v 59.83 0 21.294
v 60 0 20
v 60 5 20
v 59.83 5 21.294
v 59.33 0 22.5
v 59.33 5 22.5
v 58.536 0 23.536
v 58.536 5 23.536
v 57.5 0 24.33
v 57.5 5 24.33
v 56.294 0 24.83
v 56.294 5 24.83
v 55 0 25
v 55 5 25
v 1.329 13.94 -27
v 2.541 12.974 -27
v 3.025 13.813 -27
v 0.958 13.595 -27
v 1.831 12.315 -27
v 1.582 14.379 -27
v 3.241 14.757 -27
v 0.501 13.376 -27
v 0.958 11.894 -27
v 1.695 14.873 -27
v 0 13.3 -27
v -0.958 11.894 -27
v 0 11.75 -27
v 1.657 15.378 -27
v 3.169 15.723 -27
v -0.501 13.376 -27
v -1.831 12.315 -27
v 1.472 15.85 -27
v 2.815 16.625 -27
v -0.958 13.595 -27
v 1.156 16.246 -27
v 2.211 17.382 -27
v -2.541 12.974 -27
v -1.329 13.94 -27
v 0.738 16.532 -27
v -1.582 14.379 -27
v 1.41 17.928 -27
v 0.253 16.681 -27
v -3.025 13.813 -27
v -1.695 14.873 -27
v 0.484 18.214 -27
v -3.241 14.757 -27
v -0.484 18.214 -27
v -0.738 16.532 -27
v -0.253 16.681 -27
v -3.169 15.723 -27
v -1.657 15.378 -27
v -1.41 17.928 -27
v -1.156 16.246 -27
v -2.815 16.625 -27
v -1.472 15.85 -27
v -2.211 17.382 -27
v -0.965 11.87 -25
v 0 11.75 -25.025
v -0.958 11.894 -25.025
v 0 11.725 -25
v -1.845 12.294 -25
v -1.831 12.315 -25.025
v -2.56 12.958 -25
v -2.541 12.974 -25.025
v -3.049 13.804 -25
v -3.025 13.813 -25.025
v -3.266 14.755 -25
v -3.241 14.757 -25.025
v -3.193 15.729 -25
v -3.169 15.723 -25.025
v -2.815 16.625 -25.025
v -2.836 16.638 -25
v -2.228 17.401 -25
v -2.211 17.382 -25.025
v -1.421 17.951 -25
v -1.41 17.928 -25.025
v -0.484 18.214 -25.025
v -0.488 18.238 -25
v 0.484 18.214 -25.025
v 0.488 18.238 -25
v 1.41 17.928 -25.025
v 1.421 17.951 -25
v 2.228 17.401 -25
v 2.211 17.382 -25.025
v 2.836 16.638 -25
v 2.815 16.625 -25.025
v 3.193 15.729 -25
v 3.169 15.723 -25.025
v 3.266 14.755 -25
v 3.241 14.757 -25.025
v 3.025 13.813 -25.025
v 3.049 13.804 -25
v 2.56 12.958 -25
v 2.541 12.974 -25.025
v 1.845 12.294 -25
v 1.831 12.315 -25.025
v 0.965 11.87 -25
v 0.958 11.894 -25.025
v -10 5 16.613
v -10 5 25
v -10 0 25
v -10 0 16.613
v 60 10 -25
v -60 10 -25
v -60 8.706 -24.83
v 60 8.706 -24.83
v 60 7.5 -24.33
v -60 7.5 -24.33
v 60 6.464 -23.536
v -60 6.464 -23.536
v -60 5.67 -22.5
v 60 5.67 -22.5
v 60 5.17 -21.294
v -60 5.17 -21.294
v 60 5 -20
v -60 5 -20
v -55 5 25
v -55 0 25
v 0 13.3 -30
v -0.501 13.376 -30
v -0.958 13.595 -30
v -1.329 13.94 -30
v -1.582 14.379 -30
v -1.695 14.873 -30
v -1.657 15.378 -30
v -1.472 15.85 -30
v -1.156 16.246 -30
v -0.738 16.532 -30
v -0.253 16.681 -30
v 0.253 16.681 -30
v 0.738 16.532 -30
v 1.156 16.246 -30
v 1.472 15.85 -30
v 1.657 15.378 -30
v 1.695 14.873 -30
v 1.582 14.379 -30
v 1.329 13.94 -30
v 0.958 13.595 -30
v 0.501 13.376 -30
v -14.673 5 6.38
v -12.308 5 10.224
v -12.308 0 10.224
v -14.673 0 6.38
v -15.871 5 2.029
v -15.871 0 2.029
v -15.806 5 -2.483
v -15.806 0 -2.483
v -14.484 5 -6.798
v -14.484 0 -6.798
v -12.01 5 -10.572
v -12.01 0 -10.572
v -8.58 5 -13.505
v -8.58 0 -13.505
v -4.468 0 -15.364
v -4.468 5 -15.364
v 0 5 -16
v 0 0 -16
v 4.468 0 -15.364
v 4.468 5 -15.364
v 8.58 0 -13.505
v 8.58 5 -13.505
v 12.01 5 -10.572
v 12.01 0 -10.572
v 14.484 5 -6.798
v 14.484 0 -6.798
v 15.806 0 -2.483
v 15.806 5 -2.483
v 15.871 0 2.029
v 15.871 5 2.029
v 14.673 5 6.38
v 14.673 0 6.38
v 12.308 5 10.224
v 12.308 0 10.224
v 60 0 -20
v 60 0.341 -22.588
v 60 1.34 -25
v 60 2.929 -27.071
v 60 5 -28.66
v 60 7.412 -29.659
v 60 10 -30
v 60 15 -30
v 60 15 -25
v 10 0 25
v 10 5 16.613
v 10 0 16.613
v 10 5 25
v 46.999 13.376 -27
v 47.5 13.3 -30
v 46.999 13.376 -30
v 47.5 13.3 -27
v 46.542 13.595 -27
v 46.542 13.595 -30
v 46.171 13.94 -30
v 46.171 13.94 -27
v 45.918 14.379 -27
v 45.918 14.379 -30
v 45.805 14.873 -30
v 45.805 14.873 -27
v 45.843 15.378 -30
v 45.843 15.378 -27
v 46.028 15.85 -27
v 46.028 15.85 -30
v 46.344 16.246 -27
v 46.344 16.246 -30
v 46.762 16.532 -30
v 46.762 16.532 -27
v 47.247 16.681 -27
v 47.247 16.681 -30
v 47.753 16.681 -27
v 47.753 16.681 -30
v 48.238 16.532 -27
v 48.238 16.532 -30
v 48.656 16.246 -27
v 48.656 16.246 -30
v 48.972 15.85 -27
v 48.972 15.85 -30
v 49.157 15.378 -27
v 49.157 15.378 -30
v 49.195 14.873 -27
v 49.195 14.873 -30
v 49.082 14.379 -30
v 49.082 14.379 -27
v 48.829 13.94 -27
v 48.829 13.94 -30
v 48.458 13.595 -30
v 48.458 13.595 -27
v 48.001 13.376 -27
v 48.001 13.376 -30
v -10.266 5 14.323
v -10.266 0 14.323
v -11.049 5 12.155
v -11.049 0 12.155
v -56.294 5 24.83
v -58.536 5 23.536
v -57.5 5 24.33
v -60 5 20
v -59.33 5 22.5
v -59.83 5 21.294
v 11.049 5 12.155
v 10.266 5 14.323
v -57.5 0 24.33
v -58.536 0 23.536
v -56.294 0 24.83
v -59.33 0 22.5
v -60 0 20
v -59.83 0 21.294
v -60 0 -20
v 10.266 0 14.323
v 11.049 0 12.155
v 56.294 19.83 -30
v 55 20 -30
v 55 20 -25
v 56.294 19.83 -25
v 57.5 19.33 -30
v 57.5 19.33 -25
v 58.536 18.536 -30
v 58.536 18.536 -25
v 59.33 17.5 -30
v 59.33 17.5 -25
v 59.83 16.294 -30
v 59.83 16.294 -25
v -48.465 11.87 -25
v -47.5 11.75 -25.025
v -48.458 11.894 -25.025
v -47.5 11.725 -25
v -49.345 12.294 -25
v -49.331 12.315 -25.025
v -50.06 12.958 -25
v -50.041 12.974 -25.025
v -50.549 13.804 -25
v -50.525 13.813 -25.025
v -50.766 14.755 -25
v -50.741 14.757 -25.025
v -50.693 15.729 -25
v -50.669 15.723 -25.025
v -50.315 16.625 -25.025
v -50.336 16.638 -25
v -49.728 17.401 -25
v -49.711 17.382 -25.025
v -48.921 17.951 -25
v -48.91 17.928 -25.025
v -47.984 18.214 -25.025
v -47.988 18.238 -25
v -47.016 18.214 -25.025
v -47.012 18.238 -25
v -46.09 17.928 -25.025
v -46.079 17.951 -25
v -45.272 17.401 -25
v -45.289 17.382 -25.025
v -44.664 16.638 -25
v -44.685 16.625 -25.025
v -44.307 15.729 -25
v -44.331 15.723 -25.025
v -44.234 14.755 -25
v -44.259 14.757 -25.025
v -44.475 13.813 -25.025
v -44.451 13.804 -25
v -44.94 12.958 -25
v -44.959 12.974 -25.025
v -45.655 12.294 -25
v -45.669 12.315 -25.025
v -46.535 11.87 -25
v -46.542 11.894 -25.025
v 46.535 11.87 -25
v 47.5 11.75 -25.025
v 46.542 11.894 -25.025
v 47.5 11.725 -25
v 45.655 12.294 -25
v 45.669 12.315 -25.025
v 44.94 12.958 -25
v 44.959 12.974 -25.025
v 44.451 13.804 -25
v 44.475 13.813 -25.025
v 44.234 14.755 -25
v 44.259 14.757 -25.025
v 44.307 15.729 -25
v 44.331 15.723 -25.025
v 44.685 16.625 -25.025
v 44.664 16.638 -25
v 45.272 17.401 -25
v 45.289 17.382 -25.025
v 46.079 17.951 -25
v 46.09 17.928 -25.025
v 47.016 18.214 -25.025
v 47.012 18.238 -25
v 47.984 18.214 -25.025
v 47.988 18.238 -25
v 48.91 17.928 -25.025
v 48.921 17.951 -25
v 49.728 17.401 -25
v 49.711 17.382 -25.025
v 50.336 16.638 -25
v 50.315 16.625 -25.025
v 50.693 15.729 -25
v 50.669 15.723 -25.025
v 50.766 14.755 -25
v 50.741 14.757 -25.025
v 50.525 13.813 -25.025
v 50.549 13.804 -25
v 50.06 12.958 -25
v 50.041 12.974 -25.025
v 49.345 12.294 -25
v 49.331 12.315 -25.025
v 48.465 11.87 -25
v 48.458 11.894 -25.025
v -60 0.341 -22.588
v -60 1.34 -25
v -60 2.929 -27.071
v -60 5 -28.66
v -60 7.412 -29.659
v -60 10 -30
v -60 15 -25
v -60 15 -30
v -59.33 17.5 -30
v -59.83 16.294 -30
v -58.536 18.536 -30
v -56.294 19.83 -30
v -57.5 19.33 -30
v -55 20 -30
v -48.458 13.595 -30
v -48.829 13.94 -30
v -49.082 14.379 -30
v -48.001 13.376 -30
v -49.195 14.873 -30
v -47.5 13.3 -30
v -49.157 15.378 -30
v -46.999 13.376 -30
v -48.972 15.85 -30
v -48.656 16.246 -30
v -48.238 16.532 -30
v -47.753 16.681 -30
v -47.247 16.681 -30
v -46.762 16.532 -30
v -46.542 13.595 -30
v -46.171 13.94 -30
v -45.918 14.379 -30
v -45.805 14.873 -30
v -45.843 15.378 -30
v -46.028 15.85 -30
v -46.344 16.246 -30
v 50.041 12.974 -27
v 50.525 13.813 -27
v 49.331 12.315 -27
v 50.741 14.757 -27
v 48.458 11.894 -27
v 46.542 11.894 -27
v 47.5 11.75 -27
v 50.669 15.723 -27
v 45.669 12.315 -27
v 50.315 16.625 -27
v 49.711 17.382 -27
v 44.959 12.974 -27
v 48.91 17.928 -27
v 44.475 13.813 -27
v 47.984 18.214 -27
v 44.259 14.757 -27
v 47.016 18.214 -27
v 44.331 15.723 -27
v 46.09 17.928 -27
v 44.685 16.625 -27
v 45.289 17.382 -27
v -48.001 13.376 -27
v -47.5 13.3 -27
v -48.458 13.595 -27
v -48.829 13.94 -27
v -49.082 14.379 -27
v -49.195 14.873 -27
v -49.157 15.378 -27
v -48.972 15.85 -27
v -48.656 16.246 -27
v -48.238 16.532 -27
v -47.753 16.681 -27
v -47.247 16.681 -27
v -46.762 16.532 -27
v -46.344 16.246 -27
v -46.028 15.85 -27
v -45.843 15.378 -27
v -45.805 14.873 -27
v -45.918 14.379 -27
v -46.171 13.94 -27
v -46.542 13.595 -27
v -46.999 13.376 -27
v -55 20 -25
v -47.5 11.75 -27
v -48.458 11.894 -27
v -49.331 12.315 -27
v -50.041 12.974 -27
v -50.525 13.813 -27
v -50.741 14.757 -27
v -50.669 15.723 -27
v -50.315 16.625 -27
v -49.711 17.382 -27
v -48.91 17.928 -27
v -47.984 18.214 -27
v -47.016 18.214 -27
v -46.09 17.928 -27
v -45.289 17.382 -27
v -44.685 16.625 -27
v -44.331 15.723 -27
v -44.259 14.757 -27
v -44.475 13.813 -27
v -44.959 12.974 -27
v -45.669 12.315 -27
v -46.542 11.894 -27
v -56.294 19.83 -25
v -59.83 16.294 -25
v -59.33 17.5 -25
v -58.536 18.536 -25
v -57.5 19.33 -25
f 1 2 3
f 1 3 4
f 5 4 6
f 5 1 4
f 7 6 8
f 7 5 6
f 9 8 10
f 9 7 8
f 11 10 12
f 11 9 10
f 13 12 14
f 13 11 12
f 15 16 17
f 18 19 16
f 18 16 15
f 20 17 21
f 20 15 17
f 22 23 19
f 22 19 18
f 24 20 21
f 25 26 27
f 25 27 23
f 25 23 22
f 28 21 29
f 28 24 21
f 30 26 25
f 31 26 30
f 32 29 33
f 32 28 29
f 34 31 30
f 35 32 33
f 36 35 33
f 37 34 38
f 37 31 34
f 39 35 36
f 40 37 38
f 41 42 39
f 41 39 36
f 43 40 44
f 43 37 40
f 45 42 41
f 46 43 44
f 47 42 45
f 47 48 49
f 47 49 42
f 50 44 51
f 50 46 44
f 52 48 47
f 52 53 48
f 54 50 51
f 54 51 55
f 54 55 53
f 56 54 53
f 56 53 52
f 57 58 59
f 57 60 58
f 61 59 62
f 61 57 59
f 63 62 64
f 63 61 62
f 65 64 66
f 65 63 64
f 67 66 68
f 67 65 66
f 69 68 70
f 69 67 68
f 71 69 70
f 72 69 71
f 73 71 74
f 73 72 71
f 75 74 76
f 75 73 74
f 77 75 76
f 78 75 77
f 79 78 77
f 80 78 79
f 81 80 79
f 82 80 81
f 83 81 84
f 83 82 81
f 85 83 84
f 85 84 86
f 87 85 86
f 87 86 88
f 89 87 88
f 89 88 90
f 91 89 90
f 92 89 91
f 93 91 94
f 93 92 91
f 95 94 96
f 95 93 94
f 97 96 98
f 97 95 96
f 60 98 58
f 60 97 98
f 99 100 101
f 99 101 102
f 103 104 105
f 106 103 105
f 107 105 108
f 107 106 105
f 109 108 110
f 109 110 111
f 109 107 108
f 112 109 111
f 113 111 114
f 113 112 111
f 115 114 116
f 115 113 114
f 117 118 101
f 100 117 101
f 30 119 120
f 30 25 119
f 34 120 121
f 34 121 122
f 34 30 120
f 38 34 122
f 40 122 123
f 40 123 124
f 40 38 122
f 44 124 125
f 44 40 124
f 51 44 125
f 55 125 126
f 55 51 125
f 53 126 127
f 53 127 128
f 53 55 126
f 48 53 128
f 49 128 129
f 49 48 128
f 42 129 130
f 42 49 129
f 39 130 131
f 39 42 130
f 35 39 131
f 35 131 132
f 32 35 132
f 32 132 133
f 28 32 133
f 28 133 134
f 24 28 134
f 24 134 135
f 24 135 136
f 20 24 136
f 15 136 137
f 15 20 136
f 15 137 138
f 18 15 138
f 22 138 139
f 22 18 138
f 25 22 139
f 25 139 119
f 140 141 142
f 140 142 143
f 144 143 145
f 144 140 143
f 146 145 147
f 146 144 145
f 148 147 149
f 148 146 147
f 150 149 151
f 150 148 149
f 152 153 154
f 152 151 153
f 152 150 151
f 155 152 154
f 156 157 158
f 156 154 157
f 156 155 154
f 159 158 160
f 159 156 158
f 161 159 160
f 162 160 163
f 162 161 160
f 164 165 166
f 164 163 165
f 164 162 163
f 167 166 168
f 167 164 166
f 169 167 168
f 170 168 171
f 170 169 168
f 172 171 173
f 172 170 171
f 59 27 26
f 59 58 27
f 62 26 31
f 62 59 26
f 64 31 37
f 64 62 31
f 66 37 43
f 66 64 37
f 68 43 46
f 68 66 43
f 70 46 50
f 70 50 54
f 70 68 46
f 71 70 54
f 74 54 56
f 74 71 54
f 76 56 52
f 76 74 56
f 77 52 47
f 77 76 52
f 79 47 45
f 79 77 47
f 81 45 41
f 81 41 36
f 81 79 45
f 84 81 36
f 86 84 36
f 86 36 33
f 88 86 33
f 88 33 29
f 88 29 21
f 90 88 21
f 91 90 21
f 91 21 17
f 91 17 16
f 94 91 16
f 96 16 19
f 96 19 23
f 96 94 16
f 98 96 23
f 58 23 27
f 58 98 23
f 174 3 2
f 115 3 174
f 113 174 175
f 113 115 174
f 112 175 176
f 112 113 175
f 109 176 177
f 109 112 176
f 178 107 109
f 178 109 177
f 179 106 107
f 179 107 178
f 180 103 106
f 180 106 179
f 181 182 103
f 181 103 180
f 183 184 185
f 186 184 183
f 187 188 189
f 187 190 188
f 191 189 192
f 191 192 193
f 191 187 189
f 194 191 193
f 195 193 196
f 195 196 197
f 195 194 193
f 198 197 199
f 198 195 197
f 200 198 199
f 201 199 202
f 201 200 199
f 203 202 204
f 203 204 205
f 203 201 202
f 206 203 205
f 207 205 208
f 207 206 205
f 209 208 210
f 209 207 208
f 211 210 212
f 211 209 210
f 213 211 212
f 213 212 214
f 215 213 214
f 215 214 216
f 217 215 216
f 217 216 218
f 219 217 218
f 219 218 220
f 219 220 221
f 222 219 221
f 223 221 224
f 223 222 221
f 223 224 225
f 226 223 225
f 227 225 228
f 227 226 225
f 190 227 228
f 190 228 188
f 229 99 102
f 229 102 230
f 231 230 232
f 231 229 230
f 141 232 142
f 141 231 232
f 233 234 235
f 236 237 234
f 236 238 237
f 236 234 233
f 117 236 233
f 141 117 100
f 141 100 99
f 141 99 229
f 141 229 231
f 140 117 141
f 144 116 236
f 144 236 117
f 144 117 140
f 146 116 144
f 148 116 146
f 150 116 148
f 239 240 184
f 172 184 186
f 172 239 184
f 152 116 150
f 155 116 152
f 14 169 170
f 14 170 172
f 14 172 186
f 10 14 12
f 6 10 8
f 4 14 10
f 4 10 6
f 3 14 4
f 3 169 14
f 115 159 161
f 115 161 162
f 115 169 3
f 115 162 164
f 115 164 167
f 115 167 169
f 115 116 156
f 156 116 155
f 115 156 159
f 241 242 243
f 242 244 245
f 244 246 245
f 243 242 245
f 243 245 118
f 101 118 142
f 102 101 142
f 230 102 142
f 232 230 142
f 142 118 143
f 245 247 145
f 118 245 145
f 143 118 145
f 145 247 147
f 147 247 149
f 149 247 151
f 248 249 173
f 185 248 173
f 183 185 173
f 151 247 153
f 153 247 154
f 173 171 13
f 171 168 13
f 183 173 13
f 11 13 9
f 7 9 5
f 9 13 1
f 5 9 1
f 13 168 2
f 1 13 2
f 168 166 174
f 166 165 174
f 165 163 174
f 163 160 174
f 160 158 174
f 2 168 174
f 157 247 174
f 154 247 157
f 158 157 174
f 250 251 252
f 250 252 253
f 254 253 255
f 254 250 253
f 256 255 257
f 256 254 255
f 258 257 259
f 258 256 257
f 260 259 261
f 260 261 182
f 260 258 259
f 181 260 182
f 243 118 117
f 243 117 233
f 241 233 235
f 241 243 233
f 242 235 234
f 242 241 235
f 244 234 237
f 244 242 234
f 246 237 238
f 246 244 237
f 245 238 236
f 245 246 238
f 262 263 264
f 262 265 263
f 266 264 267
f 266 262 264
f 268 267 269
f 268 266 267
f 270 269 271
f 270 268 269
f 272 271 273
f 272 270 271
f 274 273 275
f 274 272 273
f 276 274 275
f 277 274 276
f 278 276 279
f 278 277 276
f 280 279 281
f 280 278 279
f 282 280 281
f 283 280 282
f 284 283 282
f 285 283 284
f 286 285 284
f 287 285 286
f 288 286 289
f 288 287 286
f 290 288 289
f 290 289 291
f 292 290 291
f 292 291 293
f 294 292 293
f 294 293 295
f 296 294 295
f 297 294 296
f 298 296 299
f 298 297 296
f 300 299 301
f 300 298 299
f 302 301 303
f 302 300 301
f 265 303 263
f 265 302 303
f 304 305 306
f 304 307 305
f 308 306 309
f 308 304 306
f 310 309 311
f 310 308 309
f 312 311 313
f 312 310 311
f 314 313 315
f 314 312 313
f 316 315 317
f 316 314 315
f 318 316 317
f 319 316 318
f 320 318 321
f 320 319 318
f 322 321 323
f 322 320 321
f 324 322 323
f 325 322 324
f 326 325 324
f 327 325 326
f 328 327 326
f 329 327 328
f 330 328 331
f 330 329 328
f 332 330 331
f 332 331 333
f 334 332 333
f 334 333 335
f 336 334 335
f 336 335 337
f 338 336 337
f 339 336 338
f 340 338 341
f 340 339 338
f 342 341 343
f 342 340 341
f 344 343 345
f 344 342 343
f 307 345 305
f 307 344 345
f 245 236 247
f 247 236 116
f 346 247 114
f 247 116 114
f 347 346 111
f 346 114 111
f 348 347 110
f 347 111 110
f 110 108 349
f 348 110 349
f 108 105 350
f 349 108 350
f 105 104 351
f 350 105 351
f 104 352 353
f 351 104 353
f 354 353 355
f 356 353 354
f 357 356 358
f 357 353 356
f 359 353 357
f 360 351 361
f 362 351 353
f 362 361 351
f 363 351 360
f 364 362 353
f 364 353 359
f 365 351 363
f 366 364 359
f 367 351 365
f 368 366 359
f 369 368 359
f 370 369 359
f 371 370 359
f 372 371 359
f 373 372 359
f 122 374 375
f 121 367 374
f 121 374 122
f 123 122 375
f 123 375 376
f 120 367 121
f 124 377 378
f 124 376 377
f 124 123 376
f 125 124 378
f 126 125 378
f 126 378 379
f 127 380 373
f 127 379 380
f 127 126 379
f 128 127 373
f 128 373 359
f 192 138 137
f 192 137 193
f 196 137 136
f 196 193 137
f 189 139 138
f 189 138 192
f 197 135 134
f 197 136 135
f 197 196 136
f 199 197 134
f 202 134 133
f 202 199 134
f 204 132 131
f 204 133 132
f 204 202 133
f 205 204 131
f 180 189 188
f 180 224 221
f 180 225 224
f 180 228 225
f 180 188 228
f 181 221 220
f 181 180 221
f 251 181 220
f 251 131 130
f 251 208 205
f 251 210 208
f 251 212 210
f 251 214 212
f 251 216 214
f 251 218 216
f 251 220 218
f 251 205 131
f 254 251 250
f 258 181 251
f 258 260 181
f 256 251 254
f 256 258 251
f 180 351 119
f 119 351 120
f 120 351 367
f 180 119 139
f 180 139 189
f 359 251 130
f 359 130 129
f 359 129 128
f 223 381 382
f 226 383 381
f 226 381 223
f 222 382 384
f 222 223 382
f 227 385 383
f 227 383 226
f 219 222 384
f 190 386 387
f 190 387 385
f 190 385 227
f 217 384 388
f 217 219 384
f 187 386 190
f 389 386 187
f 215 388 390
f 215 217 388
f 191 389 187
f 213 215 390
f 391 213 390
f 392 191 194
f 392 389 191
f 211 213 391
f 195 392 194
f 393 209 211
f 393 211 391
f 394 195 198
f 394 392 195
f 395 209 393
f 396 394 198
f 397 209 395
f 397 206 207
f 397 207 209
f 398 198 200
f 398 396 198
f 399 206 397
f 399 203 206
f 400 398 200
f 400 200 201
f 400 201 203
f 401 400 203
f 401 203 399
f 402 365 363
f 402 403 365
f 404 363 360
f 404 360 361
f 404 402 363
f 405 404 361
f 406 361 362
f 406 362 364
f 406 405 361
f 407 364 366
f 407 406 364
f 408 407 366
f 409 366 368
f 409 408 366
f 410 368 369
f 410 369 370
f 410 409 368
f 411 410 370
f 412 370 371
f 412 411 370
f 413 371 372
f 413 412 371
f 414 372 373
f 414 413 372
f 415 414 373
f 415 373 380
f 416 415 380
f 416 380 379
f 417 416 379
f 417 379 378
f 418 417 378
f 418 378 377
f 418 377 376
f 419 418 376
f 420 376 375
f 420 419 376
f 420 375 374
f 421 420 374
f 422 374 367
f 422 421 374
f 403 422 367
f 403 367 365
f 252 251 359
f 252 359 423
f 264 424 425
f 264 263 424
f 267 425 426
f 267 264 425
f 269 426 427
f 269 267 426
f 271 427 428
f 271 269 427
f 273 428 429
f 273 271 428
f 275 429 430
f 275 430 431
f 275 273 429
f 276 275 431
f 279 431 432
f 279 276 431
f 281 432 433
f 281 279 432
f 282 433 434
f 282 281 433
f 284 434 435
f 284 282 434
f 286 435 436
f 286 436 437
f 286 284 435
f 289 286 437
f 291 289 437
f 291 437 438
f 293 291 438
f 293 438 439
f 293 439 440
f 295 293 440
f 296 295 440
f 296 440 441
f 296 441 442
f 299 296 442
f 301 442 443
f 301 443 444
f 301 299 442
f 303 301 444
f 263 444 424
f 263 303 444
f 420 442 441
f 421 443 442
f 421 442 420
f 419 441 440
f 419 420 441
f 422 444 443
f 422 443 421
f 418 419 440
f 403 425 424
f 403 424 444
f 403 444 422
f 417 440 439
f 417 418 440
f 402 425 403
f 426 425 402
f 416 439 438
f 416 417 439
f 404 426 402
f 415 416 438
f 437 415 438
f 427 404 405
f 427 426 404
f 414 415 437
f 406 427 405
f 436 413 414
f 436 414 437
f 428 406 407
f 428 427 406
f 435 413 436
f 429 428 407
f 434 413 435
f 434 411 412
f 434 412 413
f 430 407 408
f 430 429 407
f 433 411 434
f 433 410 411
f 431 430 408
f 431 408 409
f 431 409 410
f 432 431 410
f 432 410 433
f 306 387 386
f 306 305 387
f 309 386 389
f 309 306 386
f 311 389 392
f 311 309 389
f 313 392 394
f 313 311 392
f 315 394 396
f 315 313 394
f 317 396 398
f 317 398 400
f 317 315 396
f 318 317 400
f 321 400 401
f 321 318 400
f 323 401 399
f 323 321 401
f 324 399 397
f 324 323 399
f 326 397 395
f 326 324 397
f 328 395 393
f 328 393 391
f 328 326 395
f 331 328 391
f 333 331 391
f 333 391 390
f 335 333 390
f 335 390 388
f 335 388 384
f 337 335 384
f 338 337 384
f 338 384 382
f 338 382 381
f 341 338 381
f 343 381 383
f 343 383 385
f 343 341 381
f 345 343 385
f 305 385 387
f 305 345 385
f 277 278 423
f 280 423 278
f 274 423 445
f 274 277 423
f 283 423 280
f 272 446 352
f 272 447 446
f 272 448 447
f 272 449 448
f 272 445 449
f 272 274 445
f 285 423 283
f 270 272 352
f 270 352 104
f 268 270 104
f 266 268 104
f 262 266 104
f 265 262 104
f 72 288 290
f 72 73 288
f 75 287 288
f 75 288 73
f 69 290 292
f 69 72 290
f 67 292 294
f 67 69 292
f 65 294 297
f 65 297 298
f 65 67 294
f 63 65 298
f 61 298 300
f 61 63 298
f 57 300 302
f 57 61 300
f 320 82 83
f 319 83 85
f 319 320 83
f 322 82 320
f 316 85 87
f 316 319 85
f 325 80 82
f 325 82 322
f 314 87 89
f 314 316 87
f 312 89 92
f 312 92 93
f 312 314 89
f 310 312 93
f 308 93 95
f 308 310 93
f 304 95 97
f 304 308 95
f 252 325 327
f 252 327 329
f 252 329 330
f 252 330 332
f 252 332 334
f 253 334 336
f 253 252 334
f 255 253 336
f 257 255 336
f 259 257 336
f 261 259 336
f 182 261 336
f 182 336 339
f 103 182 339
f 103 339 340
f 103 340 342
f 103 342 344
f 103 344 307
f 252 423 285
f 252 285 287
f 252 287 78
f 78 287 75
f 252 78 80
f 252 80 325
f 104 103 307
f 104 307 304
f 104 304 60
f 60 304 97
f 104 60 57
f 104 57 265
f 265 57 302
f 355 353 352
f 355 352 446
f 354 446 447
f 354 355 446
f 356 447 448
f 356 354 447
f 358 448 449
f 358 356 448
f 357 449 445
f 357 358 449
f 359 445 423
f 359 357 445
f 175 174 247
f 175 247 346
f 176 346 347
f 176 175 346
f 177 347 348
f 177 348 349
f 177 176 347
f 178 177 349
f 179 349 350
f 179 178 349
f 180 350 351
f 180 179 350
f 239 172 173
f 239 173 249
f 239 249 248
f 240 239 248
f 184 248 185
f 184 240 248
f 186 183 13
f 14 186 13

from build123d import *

# Parameters (mm, degrees)
SKETCH1_W                                  = 120
SKETCH1_H                                  = 50
BASE_FLANGE1_DEPTH                         = 5
EDGE_FLANGE1_STRIP_W                       = 30
EDGE_FLANGE1_STRIP_H                       = 5
EDGE_FLANGE1_STRIP_CUT_DEPTH               = 120
EDGE_FLANGE1_DEPTH                         = 120
CUT_EXTRUDE1_DEPTH                         = 10
CBORE_FOR_M3_CHEESE_HEAD_SCREW1_AT_2_COUNT = 2
CBORE_FOR_M3_CHEESE_HEAD_SCREW1_AT_2_PITCH = 47.5
CBORE_FOR_M3_CHEESE_HEAD_SCREW1_AT_3_COUNT = 2
CBORE_FOR_M3_CHEESE_HEAD_SCREW1_AT_3_PITCH = 95
BREAK_CORNER1_START                        = -30
BREAK_CORNER1_DEPTH                        = 5
BREAK_CORNER1_2_DEPTH                      = 5


# Read off the part's stored shape, not the designer's step: Break-Corner1
# Sheet-metal steps are written as plain solids
with BuildPart() as part:
    # Sketch1 → Base-Flange1 (new body)
    with BuildSketch(Plane(origin=(0, 0, 0), x_dir=(1, 0, 0), z_dir=(0, 1, 0))):
        Rectangle(SKETCH1_W, SKETCH1_H)
    extrude(amount=BASE_FLANGE1_DEPTH)

    # Edge-Flange1 strip (across the edge) → Edge-Flange1 strip cut (cut)
    with BuildSketch(Plane(origin=(60, 5, -25), x_dir=(0, 0, 1), z_dir=(-1, 0, 0))):
        with Locations((-10, -2.5)):
            Rectangle(EDGE_FLANGE1_STRIP_W, EDGE_FLANGE1_STRIP_H)
    extrude(amount=EDGE_FLANGE1_STRIP_CUT_DEPTH, mode=Mode.SUBTRACT)

    # Edge-Flange1 section (across the edge) → Edge-Flange1 (add)
    with BuildSketch(Plane(origin=(60, 5, -25), x_dir=(0, 0, 1), z_dir=(-1, 0, 0))):
        with BuildLine():
            Line((-5, 5), (-5, 15))
            Line((-5, 15), (0, 15))
            Line((0, 15), (0, 5))
            ThreePointArc((0, 5), (1.464466094, 1.464466094), (5, 0))
            Line((5, 0), (5, -5))
            ThreePointArc((5, -5), (-2.071067812, -2.071067812), (-5, 5))
        make_face()
    extrude(amount=EDGE_FLANGE1_DEPTH)

    # Sketch9 → Cut-Extrude1 (cut)
    with BuildSketch(Plane(origin=(0, 5, 0), x_dir=(1, 0, 0), z_dir=(0, 1, 0))):
        with BuildLine():
            Line((-10, -25), (-10, -16.613247726))
            ThreePointArc((-10, -16.613247726), (-10.594600569, -13.216416623), (-12.307692308, -10.223537062))
            ThreePointArc((-12.307692308, -10.223537062), (0, 16), (12.307692308, -10.223537062))
            ThreePointArc((12.307692308, -10.223537062), (10.594600569, -13.216416623), (10, -16.613247726))
            Line((10, -16.613247726), (10, -25))
            Line((10, -25), (-10, -25))
        make_face()
    extrude(amount=-CUT_EXTRUDE1_DEPTH, mode=Mode.SUBTRACT)

    # Sketch14 → CBORE for M3 Cheese Head Screw1 (revolve, cut)
    with BuildSketch(Plane(origin=(-47.5, 15, -25), x_dir=(0, -1, 0), z_dir=(1, 0, 0))):
        Polygon((0, 0), (0, 5), (1.7, 5), (1.7, 2), (3.25, 2), (3.25, 0.025), (3.275, 0), align=None)
    cbore_for_m3_cheese_head_screw1 = revolve(axis=Axis((-47.5, 15, -18.65), (0, 0, -1)), mode=Mode.SUBTRACT)

    # CBORE for M3 Cheese Head Screw1 at 2: CBORE for M3 Cheese Head Screw1 ×2
    with Locations(*[(i * CBORE_FOR_M3_CHEESE_HEAD_SCREW1_AT_2_PITCH, 0, 0) for i in range(1, CBORE_FOR_M3_CHEESE_HEAD_SCREW1_AT_2_COUNT)]):
        add(cbore_for_m3_cheese_head_screw1, mode=Mode.SUBTRACT)

    # CBORE for M3 Cheese Head Screw1 at 3: CBORE for M3 Cheese Head Screw1 ×2
    with Locations(*[(i * CBORE_FOR_M3_CHEESE_HEAD_SCREW1_AT_3_PITCH, 0, 0) for i in range(1, CBORE_FOR_M3_CHEESE_HEAD_SCREW1_AT_3_COUNT)]):
        add(cbore_for_m3_cheese_head_screw1, mode=Mode.SUBTRACT)

    # Break-Corner1 outline → Break-Corner1 (cut)
    with BuildSketch(Plane.XY.offset(BREAK_CORNER1_START)):
        with BuildLine():
            Line((60, 20), (55, 20))
            ThreePointArc((55, 20), (58.535533906, 18.535533906), (60, 15))
            Line((60, 15), (60, 20))
        make_face()
        with BuildLine():
            ThreePointArc((-60, 15), (-58.535533906, 18.535533906), (-55, 20))
            Line((-55, 20), (-60, 20))
            Line((-60, 20), (-60, 15))
        make_face()
    extrude(amount=BREAK_CORNER1_DEPTH, mode=Mode.SUBTRACT)

    # Break-Corner1 2 outline → Break-Corner1 2 (cut)
    with BuildSketch(Plane(origin=(0, 0, 0), x_dir=(1, 0, 0), z_dir=(0, 1, 0))):
        with BuildLine():
            Line((60, -25), (60, -20))
            ThreePointArc((60, -20), (58.535533906, -23.535533906), (55, -25))
            Line((55, -25), (60, -25))
        make_face()
        with BuildLine():
            Line((-60, -25), (-55, -25))
            ThreePointArc((-55, -25), (-58.535533906, -23.535533906), (-60, -20))
            Line((-60, -20), (-60, -25))
        make_face()
    extrude(amount=BREAK_CORNER1_2_DEPTH, mode=Mode.SUBTRACT)


solid = part.part
